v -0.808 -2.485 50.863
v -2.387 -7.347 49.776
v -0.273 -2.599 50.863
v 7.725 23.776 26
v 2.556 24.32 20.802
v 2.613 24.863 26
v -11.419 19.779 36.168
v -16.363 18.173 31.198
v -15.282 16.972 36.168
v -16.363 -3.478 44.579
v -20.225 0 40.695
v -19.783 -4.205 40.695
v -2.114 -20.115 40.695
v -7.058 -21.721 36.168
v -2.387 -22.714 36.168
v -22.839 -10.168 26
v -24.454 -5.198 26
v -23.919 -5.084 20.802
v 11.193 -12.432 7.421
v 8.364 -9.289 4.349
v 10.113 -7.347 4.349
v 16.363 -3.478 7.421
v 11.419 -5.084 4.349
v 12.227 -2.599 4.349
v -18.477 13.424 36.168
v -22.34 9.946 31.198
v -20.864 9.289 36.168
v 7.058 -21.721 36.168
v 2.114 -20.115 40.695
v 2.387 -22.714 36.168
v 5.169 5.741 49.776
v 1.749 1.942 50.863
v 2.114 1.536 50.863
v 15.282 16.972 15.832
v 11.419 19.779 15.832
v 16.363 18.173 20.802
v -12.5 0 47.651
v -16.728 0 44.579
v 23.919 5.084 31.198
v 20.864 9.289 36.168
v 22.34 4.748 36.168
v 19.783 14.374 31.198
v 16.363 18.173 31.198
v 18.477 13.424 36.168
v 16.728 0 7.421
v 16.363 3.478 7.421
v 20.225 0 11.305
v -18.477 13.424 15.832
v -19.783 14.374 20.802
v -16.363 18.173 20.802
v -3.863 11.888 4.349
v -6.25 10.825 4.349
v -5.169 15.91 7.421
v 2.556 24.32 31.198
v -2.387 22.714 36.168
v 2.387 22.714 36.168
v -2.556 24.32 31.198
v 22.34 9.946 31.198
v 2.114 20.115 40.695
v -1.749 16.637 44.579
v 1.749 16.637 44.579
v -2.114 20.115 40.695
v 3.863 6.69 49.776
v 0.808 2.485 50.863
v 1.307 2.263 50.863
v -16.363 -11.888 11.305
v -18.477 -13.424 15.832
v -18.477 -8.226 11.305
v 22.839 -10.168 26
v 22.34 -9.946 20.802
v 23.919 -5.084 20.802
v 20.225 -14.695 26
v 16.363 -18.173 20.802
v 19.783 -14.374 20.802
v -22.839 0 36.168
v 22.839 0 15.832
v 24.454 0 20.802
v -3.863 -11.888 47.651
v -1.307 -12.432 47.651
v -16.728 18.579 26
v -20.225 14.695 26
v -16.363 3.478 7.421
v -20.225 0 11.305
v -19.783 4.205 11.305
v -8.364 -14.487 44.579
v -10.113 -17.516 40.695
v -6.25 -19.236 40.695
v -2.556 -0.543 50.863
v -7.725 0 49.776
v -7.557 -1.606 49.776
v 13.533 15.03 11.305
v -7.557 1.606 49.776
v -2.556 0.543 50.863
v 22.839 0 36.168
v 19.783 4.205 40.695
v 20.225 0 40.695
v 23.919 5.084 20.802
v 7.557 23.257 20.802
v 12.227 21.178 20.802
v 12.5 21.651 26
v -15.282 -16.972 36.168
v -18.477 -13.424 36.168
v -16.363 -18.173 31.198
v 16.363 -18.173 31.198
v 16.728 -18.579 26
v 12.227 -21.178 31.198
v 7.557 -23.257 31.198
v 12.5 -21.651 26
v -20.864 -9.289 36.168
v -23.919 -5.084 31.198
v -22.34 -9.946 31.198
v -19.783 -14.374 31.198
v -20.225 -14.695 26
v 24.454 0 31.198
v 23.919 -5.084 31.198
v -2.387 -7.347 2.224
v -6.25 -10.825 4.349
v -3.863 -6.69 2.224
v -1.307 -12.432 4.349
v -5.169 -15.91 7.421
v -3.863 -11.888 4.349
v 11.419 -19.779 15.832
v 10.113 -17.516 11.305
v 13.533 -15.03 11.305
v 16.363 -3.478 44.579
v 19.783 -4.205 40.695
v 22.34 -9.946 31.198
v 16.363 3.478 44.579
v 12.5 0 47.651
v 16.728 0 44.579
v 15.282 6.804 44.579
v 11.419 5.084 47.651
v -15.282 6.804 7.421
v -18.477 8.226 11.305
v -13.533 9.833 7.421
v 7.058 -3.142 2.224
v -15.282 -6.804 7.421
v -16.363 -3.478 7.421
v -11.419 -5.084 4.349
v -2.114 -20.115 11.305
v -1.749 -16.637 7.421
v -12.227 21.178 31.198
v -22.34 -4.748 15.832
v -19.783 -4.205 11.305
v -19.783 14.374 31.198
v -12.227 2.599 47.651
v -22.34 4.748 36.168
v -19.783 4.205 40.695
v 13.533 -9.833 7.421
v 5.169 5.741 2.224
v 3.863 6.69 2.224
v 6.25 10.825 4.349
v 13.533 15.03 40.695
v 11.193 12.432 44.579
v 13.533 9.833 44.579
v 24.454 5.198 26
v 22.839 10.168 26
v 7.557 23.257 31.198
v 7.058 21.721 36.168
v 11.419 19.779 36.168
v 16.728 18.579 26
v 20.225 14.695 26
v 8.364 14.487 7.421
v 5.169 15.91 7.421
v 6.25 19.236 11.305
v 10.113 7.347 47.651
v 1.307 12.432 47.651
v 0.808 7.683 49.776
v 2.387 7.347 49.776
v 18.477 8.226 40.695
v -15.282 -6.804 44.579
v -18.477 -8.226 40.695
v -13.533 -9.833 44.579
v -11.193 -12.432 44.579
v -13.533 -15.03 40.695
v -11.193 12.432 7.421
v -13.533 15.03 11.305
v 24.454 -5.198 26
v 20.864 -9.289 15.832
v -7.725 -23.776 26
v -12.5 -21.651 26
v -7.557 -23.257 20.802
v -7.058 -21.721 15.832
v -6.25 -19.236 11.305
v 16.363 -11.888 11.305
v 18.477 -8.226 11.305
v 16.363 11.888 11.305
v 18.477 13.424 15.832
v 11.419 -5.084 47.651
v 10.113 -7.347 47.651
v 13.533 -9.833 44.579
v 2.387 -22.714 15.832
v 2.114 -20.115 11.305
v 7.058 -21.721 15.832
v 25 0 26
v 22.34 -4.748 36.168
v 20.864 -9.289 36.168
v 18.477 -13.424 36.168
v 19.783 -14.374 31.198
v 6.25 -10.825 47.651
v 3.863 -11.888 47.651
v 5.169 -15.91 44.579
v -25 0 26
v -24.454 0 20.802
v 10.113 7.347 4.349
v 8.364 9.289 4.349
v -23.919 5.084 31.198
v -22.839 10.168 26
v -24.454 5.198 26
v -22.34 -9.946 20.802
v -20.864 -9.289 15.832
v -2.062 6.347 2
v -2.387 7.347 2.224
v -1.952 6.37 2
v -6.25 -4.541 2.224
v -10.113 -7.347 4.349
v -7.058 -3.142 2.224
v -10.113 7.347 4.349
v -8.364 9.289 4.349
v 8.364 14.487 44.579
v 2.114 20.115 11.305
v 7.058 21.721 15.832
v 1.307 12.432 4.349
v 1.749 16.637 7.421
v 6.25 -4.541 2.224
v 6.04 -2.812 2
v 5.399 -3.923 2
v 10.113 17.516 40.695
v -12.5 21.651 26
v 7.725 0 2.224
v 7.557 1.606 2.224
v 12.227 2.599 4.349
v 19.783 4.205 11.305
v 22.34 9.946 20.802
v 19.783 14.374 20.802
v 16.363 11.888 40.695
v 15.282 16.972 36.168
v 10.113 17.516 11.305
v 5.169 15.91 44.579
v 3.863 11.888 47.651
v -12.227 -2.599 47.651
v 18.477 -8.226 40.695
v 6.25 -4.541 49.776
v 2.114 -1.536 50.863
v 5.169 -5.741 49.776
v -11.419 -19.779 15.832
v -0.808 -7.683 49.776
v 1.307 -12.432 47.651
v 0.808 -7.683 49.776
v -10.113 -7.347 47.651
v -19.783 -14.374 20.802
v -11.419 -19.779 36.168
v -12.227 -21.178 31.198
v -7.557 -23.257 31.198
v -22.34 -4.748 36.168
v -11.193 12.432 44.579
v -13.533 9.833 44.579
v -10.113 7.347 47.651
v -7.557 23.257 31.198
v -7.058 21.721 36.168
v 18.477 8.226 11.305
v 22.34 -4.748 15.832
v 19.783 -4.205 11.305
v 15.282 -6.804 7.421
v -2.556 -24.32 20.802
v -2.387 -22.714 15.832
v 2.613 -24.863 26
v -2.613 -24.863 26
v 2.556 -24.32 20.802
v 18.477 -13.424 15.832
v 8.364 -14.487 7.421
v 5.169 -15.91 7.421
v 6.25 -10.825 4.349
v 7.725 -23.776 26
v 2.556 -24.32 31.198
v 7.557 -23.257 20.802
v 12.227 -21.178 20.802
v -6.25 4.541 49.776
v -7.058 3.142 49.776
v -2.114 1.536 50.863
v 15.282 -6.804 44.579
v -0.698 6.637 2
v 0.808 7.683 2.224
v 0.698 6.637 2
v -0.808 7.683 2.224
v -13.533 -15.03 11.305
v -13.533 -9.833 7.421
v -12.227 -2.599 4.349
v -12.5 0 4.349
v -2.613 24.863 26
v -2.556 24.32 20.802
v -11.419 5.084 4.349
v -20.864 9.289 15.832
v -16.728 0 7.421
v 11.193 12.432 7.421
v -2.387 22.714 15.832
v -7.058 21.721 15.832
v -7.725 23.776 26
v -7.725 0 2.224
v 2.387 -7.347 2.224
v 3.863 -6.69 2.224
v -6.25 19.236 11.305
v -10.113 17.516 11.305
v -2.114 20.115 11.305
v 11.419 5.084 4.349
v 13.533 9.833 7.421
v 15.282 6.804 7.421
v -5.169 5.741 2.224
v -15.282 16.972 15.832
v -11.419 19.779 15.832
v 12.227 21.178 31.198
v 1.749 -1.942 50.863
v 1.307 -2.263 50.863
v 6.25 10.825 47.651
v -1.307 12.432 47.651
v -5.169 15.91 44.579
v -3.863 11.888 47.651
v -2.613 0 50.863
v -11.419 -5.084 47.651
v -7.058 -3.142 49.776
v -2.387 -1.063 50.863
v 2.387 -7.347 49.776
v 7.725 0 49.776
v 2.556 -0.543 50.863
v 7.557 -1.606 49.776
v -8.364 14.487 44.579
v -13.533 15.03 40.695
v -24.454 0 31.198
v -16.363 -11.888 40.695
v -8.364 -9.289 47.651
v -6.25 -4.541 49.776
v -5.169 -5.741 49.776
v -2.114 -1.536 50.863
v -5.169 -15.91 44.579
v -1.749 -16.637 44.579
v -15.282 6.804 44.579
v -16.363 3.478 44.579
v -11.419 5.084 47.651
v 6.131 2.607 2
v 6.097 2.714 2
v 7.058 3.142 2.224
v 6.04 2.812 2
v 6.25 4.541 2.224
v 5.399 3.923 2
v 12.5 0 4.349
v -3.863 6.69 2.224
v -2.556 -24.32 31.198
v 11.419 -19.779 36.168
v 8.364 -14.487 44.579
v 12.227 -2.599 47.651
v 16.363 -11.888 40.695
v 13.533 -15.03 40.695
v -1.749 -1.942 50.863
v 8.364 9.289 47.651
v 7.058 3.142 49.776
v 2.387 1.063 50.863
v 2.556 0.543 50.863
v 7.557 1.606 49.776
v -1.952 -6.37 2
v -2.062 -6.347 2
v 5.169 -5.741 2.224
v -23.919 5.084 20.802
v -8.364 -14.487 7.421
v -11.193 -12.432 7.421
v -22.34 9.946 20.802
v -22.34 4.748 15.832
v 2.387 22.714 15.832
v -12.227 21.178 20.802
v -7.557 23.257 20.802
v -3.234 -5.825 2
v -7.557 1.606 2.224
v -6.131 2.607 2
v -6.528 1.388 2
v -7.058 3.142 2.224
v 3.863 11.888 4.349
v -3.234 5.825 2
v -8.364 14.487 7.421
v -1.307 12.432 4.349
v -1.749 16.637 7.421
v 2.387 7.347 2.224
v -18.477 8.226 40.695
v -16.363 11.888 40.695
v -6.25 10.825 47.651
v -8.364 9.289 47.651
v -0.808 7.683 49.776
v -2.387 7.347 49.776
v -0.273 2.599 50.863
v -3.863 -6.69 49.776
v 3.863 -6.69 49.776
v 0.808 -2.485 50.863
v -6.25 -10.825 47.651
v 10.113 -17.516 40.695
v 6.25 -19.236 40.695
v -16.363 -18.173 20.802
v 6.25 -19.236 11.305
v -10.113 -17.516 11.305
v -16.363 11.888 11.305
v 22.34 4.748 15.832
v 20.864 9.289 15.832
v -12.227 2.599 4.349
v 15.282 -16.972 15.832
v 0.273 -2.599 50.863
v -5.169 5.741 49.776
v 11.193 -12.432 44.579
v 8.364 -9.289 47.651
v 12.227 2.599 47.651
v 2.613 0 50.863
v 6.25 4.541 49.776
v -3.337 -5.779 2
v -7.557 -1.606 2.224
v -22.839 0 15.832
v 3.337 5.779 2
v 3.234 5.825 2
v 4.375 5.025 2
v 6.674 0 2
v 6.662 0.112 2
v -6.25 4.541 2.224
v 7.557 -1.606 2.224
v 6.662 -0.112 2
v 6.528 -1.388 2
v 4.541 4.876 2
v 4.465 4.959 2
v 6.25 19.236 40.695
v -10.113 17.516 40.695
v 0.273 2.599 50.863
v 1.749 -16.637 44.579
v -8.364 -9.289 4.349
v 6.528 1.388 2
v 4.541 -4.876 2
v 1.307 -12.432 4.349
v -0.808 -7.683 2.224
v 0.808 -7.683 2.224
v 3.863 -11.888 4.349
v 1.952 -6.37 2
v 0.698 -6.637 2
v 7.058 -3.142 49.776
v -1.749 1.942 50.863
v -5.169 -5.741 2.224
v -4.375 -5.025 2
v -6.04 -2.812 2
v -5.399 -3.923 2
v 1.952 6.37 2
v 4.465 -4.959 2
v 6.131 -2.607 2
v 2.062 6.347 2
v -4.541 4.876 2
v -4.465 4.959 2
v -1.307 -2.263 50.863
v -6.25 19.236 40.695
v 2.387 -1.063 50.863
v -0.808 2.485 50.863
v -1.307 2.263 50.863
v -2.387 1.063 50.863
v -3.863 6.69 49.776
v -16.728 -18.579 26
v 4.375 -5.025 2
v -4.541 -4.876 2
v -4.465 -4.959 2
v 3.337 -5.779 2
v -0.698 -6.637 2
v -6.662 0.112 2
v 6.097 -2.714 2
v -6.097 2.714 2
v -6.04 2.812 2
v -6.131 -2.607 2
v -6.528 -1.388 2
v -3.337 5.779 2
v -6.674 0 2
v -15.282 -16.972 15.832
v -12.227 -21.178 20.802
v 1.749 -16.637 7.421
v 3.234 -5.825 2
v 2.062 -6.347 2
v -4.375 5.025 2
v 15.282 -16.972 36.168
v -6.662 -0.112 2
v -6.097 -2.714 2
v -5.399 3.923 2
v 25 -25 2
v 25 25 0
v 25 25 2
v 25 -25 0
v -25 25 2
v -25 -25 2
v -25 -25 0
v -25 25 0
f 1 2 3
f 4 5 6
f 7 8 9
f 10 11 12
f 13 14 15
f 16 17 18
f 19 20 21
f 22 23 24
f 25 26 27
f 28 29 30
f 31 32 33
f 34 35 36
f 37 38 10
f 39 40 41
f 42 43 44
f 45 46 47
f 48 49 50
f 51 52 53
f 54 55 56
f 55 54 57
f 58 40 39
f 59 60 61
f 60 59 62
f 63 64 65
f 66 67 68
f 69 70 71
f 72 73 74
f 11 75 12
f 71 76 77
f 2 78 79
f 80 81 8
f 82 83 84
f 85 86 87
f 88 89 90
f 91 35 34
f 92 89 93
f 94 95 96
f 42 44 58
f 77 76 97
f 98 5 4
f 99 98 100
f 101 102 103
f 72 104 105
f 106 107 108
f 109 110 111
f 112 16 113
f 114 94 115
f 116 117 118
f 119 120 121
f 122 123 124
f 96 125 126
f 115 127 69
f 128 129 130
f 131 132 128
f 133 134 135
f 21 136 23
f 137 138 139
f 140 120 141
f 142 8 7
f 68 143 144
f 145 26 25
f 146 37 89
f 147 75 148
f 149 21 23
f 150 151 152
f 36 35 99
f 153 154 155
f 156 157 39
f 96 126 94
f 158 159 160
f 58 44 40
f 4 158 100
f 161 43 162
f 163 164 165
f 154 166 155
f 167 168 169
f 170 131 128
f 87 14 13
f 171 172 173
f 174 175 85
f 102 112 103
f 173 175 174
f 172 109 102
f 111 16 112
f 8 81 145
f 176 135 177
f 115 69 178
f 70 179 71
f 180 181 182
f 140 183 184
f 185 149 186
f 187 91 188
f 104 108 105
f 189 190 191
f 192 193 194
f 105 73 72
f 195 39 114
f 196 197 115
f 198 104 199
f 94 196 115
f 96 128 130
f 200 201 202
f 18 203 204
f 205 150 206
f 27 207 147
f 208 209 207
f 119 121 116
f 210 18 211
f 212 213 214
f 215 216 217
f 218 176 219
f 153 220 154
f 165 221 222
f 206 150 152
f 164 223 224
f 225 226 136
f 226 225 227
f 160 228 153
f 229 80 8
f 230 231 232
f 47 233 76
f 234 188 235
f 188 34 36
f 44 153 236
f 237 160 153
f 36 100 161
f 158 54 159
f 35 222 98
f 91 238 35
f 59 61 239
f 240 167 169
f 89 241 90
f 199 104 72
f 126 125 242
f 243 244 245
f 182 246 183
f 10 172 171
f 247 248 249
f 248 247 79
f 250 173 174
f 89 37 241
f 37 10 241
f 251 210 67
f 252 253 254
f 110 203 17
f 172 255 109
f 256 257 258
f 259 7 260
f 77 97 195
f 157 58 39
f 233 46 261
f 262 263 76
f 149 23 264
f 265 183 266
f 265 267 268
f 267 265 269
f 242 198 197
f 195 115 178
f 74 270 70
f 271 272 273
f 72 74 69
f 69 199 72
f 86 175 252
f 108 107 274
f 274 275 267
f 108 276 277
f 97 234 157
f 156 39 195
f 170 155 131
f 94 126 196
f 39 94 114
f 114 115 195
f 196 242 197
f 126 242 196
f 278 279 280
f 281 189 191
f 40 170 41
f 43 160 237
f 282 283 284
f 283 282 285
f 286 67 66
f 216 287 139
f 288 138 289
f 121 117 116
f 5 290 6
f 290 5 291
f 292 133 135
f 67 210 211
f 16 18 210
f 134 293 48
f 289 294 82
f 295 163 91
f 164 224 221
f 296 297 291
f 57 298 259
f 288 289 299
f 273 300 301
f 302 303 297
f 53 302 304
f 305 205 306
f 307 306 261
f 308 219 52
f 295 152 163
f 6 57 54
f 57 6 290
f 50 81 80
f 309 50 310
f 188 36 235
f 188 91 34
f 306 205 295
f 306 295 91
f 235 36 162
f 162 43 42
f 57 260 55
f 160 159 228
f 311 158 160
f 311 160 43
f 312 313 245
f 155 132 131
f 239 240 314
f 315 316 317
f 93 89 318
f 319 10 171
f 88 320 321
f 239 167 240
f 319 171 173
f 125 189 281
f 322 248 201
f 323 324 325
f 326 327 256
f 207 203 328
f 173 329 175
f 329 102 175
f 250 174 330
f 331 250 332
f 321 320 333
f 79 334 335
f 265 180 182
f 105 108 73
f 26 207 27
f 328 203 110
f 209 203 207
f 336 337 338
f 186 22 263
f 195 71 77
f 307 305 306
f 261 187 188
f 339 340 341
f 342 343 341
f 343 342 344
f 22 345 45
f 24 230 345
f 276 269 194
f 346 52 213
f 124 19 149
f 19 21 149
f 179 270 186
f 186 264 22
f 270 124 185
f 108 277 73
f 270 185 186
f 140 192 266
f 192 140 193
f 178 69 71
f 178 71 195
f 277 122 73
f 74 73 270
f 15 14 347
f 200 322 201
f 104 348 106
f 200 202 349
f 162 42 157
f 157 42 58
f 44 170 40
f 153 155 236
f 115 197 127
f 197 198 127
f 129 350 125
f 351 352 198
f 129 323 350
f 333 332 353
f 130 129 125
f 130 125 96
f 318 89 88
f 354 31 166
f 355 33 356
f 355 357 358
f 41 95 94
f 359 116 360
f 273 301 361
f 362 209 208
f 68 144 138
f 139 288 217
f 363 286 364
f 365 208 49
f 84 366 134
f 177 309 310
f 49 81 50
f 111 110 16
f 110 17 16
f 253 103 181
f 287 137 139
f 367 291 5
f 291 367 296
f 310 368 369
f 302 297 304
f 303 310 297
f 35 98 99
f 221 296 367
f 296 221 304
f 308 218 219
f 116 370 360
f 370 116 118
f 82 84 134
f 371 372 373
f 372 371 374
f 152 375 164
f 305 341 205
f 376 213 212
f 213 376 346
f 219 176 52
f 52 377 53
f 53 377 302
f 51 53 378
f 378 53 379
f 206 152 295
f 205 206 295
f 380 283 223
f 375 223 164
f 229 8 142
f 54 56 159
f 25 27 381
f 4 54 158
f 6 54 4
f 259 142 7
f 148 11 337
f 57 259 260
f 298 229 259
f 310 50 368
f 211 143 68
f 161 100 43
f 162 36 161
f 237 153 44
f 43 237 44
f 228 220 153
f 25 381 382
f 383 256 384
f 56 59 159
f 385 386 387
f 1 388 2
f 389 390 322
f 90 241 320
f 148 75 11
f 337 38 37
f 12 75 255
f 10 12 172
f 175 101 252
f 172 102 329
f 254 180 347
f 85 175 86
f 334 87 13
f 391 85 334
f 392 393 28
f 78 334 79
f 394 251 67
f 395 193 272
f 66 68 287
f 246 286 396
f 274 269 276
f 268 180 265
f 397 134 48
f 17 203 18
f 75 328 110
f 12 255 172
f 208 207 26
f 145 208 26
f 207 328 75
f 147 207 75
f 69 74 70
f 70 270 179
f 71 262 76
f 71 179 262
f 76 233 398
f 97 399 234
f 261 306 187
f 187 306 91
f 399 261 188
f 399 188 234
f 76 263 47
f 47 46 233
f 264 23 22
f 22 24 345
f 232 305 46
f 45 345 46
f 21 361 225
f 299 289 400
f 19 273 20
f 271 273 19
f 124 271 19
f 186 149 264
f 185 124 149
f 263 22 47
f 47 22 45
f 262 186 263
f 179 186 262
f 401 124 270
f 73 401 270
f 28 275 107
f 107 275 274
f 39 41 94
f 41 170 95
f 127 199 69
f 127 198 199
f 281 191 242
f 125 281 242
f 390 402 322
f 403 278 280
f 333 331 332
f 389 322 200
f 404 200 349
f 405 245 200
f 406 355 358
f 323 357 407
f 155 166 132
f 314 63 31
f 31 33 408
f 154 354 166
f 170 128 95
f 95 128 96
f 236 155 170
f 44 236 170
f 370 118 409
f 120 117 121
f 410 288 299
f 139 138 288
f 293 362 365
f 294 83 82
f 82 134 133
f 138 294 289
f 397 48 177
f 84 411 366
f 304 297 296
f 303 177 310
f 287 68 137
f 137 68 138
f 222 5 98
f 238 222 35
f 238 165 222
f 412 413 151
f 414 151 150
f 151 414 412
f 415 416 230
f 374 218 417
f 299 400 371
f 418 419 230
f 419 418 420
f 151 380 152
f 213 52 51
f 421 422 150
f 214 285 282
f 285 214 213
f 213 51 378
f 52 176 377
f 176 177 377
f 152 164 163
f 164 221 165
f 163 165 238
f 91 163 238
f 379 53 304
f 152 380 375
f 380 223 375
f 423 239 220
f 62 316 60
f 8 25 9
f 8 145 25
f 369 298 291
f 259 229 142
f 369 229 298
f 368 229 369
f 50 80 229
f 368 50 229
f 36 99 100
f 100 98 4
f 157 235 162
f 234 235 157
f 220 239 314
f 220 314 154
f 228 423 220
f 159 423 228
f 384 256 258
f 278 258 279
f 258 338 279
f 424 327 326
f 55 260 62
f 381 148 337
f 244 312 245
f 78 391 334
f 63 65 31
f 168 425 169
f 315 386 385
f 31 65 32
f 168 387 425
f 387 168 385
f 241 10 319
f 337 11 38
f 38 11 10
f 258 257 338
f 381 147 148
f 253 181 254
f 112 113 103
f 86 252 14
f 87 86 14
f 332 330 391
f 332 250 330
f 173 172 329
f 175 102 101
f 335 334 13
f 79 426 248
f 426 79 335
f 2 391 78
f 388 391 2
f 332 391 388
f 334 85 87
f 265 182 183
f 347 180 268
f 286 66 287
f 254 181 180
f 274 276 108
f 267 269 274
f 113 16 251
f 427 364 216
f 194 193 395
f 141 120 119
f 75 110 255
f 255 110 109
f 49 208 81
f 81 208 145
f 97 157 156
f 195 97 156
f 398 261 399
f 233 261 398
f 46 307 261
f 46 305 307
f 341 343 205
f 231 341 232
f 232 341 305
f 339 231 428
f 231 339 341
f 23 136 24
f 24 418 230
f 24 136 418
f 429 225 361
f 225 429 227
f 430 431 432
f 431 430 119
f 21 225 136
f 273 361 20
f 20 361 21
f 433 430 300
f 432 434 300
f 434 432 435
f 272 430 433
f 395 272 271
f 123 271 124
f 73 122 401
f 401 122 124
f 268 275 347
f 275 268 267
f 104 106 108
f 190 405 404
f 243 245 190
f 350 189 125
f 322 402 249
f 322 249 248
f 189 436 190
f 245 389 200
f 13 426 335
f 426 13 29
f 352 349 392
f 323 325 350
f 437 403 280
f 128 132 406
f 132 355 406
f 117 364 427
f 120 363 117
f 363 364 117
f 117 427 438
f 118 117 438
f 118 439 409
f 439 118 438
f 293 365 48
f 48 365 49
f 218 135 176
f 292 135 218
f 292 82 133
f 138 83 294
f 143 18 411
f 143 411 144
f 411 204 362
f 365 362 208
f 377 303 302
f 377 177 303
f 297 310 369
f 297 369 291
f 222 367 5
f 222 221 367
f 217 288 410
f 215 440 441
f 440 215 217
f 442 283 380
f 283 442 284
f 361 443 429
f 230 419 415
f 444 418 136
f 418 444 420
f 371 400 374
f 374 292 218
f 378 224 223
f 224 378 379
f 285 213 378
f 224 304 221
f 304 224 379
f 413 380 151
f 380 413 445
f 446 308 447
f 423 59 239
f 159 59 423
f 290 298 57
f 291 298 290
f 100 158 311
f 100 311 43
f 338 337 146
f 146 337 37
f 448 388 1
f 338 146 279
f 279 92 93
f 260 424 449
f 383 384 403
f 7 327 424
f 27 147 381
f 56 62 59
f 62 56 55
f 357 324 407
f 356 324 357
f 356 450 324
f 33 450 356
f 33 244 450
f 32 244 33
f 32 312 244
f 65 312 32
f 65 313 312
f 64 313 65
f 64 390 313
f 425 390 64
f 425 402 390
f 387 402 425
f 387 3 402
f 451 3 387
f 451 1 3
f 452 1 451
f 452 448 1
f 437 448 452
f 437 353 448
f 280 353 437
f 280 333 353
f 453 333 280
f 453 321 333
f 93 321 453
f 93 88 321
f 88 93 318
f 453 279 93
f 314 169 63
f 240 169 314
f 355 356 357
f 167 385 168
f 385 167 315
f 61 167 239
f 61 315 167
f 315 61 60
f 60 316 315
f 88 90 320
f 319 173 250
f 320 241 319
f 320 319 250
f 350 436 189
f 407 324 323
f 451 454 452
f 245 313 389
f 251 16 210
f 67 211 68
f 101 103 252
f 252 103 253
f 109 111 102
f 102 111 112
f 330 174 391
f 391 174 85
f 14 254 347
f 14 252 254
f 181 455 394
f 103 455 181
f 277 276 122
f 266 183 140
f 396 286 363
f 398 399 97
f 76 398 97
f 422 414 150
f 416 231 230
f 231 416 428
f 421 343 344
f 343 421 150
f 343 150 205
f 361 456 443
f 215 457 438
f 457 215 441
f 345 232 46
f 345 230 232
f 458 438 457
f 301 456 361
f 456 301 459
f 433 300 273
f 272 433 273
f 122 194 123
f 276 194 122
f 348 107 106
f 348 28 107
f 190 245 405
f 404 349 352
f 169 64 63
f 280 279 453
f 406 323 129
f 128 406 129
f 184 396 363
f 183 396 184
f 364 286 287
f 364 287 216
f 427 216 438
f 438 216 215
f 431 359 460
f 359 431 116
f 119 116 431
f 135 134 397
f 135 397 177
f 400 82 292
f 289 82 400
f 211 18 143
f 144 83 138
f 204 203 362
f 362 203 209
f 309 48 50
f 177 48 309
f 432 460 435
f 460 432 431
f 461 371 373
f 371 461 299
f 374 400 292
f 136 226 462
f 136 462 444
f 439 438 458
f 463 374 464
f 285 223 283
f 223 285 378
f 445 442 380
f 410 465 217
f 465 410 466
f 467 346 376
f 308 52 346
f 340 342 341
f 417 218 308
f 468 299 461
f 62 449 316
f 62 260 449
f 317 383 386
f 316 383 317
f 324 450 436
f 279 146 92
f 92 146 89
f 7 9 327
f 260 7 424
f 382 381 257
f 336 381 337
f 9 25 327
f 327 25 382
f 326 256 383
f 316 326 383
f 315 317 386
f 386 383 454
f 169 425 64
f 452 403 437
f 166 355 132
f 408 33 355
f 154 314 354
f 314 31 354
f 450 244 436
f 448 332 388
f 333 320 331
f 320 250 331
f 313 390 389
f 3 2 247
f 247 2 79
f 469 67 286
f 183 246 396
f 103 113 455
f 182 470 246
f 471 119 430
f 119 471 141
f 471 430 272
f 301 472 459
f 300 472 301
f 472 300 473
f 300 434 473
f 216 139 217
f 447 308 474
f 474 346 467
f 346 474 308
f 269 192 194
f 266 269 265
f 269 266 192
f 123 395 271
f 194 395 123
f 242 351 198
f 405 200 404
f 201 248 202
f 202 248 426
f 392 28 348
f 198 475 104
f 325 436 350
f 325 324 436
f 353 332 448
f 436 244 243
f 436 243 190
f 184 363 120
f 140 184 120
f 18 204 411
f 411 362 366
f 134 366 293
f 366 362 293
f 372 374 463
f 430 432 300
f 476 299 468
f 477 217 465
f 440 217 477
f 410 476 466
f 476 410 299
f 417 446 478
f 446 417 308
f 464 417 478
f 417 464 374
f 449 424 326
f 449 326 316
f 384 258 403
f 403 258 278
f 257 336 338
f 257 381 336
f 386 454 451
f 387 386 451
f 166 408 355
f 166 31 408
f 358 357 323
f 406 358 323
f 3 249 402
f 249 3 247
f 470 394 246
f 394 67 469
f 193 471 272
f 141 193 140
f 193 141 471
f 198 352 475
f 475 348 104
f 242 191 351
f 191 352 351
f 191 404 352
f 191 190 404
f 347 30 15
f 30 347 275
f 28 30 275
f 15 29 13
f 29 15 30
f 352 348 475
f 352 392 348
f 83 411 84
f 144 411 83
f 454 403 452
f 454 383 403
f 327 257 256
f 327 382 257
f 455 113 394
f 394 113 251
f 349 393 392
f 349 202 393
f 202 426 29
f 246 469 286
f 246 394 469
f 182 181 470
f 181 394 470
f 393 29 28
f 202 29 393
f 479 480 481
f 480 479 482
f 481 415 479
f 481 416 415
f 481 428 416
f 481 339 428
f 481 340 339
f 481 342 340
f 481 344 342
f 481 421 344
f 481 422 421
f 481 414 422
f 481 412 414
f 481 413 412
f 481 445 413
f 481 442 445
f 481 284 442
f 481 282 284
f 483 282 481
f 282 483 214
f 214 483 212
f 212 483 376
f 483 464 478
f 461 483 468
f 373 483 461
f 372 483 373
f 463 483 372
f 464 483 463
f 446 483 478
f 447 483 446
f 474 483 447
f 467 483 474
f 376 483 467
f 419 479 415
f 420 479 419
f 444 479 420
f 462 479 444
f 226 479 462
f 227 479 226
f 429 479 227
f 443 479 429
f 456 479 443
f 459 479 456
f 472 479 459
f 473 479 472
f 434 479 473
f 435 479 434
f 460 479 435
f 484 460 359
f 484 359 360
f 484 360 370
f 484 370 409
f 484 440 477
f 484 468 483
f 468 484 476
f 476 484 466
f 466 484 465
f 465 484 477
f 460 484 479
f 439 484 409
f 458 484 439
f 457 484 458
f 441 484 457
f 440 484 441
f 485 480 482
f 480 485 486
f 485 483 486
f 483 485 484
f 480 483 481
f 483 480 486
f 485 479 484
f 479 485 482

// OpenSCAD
translate([0,0,1]) {
	union() {
		translate([0,0,25])
			sphere(25);
		cube(size=[50,50,2], center=true);
	}
}
